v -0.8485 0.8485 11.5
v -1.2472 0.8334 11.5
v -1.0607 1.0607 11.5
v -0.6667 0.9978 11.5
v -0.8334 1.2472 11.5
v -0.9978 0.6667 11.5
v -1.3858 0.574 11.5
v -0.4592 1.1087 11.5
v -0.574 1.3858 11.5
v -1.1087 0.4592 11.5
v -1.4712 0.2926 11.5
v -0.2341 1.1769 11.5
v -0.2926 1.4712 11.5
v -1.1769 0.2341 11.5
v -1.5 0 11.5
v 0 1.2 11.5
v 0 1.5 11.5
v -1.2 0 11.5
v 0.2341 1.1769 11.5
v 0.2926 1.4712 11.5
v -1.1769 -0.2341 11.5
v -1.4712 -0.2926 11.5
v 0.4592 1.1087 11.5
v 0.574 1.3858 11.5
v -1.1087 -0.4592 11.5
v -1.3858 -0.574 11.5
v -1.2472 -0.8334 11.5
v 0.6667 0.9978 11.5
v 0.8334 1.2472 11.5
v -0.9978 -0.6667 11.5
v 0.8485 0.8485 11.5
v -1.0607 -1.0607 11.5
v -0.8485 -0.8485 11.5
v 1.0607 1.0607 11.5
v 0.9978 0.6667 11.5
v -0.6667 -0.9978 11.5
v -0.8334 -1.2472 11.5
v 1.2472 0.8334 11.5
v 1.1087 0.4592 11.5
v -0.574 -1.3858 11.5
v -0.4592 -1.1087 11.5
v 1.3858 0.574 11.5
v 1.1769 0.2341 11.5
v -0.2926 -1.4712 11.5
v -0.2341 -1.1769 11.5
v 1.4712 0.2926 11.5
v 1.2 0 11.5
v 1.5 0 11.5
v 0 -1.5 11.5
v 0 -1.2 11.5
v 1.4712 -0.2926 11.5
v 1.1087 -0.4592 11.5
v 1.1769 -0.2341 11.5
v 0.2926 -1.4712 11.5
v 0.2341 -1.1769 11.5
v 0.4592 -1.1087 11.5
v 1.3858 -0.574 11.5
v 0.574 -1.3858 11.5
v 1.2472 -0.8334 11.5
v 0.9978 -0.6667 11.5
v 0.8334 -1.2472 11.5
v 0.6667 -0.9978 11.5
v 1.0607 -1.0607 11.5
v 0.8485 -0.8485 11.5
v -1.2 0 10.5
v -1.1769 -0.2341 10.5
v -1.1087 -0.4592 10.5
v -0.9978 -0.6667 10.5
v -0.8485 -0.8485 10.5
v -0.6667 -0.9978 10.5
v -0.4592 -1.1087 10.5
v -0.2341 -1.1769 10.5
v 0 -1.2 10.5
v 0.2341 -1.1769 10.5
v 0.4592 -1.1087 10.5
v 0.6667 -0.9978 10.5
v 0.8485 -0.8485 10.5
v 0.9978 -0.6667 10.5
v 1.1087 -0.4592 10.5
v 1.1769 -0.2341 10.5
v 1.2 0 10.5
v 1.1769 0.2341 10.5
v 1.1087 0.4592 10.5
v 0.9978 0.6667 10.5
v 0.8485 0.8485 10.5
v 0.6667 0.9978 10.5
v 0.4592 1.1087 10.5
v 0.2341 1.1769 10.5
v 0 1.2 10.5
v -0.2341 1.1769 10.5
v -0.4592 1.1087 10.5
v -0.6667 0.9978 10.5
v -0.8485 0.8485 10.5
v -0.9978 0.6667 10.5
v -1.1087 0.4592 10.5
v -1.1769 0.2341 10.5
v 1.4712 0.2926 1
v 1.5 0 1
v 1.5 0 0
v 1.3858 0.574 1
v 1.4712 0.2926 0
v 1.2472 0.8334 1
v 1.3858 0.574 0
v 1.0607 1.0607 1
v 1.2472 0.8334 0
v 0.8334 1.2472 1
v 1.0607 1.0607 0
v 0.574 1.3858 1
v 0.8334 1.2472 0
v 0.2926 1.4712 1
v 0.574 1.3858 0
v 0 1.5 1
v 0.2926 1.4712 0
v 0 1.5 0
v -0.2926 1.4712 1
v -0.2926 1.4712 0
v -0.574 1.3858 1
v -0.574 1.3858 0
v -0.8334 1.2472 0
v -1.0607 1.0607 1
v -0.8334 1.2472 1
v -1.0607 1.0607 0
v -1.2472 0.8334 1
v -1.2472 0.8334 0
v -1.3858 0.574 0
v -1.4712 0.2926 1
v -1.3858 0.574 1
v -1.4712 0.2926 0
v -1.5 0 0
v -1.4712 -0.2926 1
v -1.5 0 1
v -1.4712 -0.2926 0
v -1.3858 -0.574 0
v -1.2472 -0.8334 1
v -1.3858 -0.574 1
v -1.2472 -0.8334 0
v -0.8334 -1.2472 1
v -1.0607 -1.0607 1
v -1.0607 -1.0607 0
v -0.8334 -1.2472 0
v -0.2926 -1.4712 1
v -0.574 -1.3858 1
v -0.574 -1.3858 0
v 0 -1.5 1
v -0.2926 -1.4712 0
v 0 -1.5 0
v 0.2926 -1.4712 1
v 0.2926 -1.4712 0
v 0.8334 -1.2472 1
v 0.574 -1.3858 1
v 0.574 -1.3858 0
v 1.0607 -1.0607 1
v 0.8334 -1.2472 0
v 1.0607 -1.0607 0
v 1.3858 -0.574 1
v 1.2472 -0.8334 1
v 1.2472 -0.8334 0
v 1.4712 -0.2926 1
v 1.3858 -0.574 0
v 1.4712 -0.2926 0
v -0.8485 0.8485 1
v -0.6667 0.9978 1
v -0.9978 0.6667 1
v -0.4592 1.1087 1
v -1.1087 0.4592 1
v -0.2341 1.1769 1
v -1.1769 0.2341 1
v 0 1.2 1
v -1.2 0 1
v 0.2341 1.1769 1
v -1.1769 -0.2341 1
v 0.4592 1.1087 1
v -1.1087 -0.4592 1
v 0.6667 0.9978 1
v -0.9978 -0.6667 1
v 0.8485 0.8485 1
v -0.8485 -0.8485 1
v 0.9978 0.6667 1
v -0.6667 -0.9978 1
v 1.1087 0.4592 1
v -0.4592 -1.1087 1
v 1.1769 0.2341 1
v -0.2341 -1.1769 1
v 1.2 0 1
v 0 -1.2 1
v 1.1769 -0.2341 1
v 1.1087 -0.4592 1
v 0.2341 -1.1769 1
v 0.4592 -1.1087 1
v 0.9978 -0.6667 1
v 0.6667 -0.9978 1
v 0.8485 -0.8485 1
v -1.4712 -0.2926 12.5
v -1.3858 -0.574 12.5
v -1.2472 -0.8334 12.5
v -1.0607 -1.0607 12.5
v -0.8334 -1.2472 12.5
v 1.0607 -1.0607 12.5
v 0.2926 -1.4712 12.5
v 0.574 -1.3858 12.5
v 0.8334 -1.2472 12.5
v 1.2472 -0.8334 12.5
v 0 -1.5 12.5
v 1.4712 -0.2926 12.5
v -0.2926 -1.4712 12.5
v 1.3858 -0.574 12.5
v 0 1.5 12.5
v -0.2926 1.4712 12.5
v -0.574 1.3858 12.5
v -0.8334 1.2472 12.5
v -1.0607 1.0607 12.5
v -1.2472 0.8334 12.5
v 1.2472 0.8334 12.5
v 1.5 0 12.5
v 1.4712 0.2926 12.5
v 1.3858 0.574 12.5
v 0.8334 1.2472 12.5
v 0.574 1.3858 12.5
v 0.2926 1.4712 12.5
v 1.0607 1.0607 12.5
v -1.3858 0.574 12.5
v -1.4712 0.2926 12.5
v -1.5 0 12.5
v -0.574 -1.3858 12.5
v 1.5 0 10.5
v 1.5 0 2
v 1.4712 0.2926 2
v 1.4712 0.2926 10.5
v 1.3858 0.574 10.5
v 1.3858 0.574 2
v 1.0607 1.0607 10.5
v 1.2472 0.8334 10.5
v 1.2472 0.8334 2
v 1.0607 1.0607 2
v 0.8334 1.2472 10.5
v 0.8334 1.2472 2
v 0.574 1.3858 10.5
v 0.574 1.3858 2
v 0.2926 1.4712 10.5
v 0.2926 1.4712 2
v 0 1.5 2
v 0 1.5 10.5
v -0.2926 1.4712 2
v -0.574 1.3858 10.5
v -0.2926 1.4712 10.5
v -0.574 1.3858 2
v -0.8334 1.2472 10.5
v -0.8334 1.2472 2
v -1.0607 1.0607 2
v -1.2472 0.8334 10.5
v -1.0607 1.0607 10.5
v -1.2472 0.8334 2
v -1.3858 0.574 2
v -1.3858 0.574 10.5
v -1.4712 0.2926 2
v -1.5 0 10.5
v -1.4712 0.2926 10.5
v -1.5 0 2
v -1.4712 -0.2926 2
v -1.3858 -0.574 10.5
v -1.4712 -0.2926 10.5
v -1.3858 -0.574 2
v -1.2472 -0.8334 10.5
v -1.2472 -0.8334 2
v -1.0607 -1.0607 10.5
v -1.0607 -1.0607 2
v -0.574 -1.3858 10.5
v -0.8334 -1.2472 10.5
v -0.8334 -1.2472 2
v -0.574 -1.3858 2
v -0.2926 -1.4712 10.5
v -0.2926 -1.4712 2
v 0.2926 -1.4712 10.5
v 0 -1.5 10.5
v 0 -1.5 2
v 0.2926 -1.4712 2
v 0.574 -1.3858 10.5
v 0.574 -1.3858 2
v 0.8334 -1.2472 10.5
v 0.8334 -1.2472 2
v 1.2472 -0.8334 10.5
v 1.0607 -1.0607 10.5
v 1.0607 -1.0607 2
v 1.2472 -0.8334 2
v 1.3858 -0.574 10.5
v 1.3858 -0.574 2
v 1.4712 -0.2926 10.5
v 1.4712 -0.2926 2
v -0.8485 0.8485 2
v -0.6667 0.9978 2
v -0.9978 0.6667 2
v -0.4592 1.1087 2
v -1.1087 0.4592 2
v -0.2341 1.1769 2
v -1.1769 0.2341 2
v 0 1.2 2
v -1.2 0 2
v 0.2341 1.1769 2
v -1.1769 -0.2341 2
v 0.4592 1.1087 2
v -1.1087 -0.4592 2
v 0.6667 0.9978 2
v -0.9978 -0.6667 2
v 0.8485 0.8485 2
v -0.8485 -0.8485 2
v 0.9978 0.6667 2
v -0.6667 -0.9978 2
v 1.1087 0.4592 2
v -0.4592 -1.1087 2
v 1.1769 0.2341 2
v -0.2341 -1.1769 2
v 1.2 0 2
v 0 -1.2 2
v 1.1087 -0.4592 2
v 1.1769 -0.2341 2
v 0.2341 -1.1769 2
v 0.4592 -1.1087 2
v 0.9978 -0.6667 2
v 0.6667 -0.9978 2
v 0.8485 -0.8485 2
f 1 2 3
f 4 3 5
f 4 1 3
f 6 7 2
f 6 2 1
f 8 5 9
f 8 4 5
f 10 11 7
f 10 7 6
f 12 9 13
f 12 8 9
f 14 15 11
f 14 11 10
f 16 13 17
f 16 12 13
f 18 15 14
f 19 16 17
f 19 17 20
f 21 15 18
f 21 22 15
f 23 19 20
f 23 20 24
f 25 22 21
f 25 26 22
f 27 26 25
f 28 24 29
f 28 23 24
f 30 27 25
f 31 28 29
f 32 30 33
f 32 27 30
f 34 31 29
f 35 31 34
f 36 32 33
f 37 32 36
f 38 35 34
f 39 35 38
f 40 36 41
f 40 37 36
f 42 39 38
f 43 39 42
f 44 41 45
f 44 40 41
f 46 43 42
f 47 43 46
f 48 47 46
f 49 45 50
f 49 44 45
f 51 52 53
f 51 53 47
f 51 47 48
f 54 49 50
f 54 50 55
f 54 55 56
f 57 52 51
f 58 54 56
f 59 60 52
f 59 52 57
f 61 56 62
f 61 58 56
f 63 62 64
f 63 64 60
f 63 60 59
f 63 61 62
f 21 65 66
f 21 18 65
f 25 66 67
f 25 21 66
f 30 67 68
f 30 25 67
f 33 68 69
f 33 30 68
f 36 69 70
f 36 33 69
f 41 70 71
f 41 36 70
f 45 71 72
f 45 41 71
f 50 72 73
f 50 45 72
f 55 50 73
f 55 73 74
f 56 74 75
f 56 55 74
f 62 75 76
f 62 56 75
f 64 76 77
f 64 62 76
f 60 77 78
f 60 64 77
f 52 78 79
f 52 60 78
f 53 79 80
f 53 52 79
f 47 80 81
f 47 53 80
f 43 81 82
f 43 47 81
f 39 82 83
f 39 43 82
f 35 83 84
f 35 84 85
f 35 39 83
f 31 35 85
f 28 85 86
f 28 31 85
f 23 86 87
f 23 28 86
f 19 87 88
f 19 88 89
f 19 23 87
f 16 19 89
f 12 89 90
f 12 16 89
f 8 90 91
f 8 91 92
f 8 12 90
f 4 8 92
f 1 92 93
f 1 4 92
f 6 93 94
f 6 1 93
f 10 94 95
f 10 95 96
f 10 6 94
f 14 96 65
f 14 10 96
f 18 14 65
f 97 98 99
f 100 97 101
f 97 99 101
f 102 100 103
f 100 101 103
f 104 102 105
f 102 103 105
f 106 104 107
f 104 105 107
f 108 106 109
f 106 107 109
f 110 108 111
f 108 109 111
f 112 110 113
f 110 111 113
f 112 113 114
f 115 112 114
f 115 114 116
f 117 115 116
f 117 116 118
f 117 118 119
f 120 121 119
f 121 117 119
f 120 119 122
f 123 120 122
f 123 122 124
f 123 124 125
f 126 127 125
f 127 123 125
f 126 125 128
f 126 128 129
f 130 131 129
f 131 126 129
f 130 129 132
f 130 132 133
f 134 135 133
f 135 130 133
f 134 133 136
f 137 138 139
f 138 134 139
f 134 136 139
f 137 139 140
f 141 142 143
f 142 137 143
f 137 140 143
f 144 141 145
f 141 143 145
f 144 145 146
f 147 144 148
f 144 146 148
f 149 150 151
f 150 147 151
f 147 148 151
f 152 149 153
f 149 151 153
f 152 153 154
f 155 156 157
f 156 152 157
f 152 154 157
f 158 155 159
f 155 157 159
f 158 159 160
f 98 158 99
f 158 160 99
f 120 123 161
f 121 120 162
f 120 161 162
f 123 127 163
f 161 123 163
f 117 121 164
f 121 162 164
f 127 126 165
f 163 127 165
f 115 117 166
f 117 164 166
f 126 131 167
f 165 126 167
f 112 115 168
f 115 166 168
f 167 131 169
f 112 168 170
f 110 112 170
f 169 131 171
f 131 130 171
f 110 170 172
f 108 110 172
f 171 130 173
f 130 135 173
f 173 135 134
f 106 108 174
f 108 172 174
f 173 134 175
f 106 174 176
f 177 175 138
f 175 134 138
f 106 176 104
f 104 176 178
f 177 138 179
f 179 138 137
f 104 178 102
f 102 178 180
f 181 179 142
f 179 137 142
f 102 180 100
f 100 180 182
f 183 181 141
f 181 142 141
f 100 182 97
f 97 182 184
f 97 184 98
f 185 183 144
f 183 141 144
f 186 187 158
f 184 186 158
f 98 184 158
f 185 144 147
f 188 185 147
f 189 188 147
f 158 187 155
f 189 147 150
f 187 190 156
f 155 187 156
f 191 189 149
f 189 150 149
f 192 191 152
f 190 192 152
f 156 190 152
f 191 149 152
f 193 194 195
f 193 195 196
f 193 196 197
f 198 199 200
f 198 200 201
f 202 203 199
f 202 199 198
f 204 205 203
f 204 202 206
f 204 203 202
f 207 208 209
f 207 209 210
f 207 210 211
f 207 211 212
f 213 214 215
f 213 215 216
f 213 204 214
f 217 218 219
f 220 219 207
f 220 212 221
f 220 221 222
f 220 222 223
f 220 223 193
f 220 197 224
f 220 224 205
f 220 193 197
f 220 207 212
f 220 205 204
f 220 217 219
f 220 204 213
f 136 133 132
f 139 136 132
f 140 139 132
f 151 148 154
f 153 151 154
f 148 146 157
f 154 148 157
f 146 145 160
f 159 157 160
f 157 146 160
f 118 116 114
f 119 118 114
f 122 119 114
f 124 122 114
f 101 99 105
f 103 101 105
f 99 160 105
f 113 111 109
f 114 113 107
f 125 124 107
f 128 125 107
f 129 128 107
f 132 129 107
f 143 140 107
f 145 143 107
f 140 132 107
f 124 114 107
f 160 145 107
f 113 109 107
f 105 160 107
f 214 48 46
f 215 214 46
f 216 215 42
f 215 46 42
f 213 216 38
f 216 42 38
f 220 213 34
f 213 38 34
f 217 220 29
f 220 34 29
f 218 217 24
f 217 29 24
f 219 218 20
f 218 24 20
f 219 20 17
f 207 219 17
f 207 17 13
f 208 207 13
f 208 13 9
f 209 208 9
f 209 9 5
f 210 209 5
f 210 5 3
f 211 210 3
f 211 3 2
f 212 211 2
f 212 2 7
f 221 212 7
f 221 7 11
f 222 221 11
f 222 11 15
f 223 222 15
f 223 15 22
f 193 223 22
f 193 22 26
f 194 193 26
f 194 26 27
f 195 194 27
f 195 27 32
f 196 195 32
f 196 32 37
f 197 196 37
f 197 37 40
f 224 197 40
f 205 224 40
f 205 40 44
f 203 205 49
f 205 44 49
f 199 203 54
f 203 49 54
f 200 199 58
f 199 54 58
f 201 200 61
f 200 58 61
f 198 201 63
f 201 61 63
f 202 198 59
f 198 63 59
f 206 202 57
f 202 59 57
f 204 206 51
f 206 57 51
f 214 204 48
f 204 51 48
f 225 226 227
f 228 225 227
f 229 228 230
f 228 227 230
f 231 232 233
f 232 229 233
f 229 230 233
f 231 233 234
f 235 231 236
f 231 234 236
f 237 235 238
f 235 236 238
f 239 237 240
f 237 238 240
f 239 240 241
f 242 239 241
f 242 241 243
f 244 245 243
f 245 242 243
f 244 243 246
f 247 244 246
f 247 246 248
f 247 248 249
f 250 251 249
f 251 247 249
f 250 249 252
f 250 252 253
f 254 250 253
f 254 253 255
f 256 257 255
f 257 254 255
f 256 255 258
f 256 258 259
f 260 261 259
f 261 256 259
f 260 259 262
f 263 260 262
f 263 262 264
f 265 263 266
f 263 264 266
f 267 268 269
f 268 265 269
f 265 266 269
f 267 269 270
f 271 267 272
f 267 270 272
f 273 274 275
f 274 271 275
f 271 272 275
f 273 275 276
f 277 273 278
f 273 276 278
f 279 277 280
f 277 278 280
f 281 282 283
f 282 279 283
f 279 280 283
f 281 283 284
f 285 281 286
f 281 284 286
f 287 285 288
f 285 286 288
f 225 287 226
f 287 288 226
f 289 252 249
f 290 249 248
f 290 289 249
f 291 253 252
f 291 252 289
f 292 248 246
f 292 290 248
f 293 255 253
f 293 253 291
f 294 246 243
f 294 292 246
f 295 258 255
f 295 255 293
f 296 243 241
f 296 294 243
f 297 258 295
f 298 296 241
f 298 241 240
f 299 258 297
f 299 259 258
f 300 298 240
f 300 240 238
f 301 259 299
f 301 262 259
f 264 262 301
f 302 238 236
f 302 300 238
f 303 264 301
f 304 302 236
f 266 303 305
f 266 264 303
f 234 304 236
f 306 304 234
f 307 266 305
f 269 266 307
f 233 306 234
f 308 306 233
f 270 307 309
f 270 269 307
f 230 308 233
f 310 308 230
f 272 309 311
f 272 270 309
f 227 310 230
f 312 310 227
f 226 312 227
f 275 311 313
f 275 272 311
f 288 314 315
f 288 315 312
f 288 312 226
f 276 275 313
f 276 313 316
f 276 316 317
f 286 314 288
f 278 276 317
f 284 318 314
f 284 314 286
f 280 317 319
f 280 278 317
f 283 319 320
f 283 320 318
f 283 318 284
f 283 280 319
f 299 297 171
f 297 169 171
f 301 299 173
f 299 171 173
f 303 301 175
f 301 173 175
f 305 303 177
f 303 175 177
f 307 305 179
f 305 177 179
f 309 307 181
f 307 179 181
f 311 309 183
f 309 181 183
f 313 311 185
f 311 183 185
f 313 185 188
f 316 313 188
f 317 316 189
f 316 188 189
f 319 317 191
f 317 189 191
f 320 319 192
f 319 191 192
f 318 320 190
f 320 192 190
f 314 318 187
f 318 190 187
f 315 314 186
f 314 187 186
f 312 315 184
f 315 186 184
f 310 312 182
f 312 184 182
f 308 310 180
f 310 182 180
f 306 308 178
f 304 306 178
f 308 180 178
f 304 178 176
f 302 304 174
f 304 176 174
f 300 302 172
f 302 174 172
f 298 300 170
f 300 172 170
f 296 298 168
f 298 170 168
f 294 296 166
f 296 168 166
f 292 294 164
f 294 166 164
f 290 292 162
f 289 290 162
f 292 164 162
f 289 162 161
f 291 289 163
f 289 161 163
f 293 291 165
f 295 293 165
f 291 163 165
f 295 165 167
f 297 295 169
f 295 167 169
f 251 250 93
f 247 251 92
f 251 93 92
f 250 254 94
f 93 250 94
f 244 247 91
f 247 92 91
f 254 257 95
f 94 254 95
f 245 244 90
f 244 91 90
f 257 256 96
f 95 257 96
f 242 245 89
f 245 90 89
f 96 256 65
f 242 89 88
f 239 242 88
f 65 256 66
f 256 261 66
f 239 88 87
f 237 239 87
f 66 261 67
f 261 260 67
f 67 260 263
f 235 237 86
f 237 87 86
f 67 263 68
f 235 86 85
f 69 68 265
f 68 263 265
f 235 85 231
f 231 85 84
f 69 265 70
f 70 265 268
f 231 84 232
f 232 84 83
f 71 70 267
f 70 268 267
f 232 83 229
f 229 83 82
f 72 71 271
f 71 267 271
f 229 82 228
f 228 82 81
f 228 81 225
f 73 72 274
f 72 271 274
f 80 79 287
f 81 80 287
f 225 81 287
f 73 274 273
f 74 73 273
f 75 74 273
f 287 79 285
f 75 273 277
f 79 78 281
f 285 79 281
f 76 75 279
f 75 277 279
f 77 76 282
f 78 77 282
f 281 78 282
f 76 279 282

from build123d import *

# Parameters (mm, degrees)
SKETCH1_R           = 1.5
BOSS_EXTRUDE1_DEPTH = 12.5
SKETCH2_W           = 1
SKETCH2_H           = 1.937236023


with BuildPart() as part:
    # Sketch1 → Boss-Extrude1 (new body)
    with BuildSketch(Plane.XY):
        Circle(SKETCH1_R)
    extrude(amount=BOSS_EXTRUDE1_DEPTH)

    # Sketch2 → Cut-Revolve1 (revolve, cut)
    with BuildSketch(Plane(origin=(0, 0, 0), x_dir=(0, 0, -1), z_dir=(1, 0, 0)), mode=Mode.PRIVATE) as cut_revolve1_sk:
        with Locations((-1.5, 2.168618012)):
            Rectangle(SKETCH2_W, SKETCH2_H)
    cut_revolve1 = revolve(cut_revolve1_sk.sketch.rotate(Axis((0, 0, 0), (0, 0, 1)), 90), axis=Axis((0, 0, 0), (0, 0, 1)), mode=Mode.SUBTRACT)

    # Mirror1: Cut-Revolve1 across plane
    add(cut_revolve1.mirror(Plane.XY.offset(6.25)), mode=Mode.SUBTRACT)


solid = part.part
